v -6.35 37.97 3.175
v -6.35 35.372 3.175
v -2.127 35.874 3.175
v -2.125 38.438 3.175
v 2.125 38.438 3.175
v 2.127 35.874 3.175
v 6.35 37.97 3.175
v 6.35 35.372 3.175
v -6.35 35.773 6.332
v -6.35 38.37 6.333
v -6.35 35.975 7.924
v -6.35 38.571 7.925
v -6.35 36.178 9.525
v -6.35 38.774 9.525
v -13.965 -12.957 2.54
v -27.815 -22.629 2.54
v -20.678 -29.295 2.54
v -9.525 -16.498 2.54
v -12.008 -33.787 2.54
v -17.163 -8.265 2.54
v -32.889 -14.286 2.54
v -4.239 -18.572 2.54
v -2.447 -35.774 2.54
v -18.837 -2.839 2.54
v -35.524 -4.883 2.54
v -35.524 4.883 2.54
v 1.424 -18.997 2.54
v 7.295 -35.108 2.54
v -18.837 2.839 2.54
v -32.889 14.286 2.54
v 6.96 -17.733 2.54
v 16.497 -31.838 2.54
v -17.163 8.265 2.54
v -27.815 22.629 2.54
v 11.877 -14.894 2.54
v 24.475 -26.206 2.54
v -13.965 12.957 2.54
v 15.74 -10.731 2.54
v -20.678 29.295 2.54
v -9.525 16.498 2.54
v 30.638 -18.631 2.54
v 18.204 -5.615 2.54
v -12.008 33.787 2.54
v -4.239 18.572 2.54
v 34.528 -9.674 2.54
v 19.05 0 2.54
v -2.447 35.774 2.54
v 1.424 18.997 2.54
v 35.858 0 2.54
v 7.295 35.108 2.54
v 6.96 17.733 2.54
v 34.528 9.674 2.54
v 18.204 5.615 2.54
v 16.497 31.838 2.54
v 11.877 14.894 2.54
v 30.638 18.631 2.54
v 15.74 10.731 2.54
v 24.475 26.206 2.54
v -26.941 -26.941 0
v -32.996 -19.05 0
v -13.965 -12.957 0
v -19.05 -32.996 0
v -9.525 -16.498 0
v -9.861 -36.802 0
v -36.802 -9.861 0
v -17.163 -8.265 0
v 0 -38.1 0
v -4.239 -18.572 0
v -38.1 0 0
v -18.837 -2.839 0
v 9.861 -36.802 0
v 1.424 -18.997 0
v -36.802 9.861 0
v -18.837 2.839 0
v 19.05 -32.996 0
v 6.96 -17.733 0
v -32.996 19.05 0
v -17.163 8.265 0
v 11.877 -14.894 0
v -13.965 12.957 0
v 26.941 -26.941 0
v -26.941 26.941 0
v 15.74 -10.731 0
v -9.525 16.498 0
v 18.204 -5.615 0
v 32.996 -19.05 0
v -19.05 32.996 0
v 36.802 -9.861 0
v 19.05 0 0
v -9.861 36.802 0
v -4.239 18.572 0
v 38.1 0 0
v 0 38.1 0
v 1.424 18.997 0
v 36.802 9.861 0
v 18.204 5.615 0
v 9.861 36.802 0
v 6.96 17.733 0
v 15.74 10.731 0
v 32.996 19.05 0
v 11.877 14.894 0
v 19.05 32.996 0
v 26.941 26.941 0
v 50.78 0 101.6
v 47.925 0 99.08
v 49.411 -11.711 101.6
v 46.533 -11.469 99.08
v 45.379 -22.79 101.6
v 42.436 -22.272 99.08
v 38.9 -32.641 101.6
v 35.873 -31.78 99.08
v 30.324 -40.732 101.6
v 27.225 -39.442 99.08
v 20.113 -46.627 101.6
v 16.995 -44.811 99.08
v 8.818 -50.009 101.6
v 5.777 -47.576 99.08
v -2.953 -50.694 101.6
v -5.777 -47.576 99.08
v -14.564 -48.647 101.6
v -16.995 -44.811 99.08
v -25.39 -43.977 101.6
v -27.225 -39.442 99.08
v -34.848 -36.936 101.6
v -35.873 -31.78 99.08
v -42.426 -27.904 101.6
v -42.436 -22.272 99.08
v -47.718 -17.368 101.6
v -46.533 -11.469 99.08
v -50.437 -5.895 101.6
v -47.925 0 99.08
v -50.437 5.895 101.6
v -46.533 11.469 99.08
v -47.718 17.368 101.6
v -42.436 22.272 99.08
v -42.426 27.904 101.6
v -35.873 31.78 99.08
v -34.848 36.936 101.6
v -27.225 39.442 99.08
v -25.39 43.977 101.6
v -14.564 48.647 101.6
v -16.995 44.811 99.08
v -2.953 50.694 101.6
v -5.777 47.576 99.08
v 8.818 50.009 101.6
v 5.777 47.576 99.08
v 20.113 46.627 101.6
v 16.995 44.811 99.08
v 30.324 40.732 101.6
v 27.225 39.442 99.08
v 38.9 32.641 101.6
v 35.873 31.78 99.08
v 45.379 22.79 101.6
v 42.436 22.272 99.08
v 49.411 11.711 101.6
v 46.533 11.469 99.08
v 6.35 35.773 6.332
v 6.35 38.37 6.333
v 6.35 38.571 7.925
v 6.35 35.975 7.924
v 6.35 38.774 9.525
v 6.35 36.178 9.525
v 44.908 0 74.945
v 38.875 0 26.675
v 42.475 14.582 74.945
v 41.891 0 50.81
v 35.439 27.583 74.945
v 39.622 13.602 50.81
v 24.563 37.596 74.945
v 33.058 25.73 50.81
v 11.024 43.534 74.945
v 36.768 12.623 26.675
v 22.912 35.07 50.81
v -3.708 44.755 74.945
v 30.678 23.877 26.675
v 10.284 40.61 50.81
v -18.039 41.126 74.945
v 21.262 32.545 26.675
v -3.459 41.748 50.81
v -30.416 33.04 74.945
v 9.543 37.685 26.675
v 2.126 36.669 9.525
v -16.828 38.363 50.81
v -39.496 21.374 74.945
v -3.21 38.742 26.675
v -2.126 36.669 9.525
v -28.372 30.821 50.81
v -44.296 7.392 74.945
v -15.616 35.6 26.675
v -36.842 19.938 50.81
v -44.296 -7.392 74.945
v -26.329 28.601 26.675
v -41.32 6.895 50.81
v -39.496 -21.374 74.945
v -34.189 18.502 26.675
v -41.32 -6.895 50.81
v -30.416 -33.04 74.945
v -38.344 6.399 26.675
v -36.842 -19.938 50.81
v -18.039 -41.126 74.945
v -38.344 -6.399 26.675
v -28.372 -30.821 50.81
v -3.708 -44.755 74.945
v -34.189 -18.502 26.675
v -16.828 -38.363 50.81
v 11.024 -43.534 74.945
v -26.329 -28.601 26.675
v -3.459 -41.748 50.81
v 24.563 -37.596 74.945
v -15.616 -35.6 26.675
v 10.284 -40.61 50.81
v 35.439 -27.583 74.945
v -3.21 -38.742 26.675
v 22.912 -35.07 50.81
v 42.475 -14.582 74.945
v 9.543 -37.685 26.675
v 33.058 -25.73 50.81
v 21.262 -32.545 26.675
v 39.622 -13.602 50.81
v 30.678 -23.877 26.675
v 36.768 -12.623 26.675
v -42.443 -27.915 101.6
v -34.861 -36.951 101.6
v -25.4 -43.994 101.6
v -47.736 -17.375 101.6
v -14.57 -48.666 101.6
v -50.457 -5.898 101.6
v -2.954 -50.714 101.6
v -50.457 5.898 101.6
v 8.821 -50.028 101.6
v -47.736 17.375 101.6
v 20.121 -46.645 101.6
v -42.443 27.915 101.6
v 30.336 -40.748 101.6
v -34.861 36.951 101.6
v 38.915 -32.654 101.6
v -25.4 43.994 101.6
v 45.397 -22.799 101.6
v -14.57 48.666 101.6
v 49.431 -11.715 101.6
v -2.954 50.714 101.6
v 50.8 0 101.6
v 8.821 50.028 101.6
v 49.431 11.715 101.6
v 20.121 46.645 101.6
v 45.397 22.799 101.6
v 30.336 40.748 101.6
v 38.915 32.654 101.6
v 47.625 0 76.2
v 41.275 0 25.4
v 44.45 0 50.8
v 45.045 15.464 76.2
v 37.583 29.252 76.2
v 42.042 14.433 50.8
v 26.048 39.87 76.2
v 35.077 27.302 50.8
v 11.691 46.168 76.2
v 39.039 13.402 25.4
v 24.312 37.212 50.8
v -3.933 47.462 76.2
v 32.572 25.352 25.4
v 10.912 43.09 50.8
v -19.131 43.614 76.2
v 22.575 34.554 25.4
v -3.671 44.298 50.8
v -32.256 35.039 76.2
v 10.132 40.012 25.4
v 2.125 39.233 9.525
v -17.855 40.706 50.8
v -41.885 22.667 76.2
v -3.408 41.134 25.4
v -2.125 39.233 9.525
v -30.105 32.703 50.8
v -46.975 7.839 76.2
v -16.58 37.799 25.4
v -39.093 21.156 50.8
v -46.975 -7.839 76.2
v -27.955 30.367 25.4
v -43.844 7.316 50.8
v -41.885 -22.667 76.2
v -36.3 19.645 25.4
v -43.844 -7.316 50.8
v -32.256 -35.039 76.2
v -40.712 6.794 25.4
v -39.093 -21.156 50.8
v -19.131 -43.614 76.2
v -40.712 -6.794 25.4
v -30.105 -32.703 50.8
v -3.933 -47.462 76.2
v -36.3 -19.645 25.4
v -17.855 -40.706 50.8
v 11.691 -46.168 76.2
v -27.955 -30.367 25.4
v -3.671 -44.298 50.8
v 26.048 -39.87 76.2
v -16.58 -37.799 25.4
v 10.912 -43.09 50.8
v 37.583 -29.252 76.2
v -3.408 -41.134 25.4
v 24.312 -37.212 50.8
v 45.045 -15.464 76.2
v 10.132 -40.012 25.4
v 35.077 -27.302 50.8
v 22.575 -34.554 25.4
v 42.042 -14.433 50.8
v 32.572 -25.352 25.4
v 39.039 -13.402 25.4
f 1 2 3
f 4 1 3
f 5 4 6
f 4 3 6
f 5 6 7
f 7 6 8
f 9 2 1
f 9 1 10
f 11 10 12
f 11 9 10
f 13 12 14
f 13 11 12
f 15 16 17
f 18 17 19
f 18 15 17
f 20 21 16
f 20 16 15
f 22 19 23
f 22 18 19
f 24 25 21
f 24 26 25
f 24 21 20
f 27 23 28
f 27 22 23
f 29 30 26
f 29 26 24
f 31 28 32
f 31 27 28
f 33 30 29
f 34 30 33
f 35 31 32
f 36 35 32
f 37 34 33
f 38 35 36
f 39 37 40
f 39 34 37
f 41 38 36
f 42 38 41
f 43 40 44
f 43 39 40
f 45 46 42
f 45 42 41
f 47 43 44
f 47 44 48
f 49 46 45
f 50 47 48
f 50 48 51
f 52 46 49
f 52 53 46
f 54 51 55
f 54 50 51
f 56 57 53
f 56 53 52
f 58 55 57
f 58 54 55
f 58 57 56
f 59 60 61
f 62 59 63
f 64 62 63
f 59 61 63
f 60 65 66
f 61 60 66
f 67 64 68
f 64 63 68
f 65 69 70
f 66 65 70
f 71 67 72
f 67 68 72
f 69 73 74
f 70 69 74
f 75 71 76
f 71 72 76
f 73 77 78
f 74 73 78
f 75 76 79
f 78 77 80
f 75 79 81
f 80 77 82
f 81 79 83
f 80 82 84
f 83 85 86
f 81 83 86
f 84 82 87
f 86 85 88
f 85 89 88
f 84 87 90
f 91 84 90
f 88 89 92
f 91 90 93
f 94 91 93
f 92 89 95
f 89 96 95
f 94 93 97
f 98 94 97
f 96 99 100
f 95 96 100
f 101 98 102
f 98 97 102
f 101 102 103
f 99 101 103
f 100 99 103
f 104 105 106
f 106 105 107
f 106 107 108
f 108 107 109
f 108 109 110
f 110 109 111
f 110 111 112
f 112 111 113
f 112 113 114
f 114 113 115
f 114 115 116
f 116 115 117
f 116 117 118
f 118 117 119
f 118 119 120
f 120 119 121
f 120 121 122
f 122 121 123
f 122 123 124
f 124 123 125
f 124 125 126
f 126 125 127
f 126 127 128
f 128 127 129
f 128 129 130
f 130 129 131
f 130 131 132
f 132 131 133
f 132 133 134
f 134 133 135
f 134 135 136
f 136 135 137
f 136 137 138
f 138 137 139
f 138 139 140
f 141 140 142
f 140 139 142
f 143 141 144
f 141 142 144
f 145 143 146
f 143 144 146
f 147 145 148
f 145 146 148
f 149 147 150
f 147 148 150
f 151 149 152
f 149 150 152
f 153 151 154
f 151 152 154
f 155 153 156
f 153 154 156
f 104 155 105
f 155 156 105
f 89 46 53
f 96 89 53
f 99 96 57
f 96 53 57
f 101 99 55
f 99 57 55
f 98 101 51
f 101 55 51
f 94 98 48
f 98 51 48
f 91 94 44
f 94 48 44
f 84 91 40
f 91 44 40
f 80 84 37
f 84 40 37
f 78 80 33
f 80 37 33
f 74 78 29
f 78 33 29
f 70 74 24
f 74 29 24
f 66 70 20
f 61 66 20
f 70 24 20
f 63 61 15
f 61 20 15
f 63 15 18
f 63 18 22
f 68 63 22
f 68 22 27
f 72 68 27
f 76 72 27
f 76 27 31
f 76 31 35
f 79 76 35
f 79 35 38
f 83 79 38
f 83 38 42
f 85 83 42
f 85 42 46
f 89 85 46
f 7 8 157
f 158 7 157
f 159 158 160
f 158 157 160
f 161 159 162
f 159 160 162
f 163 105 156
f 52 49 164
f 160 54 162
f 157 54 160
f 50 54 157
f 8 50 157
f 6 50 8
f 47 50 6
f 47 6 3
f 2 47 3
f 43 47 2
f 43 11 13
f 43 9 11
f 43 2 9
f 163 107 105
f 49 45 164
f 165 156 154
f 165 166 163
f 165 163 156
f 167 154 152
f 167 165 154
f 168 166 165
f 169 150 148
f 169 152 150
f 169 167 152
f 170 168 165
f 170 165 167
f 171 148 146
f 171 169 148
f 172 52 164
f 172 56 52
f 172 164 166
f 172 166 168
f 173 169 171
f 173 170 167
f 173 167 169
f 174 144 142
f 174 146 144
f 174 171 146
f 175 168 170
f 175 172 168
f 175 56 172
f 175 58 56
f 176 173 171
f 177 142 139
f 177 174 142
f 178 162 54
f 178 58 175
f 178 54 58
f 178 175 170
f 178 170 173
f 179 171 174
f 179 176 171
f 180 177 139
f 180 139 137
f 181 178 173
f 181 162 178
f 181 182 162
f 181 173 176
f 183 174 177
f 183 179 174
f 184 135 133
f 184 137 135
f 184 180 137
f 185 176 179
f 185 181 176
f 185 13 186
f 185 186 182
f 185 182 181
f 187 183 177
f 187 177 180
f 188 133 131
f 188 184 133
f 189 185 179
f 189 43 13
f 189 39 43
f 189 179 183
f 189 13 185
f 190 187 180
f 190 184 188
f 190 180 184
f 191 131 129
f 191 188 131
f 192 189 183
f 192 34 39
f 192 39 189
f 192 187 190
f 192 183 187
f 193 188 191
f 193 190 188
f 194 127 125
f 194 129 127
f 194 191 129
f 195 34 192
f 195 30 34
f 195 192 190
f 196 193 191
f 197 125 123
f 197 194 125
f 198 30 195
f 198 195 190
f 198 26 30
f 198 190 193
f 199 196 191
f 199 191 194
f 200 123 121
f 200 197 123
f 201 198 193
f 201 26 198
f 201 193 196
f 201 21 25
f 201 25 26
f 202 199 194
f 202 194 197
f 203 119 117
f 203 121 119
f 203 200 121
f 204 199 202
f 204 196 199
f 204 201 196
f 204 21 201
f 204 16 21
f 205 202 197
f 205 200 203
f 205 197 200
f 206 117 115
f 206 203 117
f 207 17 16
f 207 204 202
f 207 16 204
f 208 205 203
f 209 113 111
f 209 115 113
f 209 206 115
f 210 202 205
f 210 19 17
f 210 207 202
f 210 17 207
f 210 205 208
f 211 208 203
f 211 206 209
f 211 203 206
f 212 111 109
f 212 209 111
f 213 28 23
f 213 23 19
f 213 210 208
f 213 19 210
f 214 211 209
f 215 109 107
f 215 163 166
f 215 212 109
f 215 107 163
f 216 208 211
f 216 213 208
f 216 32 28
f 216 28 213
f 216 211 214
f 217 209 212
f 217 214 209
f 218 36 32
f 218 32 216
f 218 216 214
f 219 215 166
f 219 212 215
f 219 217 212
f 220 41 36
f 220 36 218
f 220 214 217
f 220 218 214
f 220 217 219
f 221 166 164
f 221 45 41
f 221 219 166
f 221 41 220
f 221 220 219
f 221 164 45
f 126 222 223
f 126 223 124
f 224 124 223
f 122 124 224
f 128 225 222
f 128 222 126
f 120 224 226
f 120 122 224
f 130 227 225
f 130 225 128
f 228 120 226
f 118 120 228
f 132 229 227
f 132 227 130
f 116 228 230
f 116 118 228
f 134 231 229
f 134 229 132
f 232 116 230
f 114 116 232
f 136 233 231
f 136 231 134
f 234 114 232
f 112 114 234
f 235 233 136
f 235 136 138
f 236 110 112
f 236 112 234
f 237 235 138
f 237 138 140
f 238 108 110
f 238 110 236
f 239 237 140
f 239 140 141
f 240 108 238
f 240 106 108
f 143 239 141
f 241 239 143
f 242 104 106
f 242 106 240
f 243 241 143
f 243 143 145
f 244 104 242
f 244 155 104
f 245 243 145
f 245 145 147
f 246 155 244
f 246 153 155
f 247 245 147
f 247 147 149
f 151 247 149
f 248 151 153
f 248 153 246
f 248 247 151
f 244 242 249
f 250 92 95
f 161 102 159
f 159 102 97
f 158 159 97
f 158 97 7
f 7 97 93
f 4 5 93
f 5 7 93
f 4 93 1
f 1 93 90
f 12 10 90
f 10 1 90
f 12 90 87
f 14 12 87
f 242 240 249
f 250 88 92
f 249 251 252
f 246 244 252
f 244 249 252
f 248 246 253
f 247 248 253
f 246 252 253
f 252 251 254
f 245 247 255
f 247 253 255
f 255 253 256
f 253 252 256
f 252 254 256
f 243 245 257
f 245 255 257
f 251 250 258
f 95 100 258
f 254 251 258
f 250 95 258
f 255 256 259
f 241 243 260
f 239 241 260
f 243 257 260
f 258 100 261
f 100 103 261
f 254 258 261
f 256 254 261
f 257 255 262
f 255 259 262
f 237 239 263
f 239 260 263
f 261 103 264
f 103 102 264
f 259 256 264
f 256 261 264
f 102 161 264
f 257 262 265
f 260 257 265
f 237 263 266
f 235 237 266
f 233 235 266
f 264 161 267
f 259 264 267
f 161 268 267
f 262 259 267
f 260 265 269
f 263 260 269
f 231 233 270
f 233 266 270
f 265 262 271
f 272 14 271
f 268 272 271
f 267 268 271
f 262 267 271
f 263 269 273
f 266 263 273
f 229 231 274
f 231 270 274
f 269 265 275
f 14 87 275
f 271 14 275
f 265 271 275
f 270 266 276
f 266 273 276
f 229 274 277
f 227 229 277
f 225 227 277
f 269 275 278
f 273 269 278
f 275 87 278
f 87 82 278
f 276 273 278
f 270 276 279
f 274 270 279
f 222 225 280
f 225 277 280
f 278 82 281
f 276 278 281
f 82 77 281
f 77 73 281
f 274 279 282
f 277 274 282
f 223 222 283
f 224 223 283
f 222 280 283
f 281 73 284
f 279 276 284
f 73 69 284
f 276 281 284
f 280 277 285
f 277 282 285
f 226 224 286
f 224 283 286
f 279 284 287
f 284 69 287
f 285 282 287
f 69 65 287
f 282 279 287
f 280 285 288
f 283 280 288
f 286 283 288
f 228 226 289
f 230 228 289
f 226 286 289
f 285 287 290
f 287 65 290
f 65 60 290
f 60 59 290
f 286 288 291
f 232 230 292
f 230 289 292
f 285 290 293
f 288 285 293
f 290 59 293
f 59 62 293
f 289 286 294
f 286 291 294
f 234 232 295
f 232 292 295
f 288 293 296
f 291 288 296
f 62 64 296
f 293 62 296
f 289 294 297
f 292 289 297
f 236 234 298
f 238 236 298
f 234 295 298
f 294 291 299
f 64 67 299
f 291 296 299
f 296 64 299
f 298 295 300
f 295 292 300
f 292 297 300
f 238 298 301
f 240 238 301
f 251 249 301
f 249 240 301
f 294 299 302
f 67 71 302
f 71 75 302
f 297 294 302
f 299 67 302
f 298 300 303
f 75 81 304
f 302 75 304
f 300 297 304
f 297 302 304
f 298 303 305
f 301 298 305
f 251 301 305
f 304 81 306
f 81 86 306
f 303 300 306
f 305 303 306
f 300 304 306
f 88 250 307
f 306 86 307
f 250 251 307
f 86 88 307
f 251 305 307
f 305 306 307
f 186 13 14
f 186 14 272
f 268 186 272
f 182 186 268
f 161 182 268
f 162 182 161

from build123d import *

# Parameters (mm, degrees)
F2_R     = 50.8
F0_R     = 38.1
F4_T     = -2.54
F5_W     = 12.7
F5_H     = 6.35
F6_DEPTH = 40.132
F8_R     = 19.05
F9_DEPTH = 25.4


# Not quite as in the source:
# - a fillet or chamfer that OpenCascade refuses, or shapes differently, is made with other operations: its cross-section is extruded or revolved along the edge and cut away or added


with BuildPart() as f3:
    # F2 (on offset) → F3 section 0
    with BuildSketch(Plane.XY.offset(101.6)):
        Circle(F2_R)
    # F0 (on Top) → F3 section 1
    with BuildSketch(Plane.XY):
        Circle(F0_R)
    loft()

    # F4
    f4_openings = [f3.faces().sort_by_distance(p)[0] for p in [
        (0, 0, 101.6),
    ]]
    offset(amount=F4_T, openings=f4_openings, kind=Kind.INTERSECTION)

    # F5 (on Front) → F6 (cut)
    with BuildSketch(Plane.XZ):
        with Locations((0, 6.35)):
            Rectangle(F5_W, F5_H)
    extrude(amount=-F6_DEPTH, mode=Mode.SUBTRACT)

    # F7: chamfer of 2.54 on 1 edges, made by hand

    # F7_s1 → F7_t2 (revolve, cut)
    with BuildSketch(Plane.XZ):
        Polygon((50.7802331649, 101.6), (47.9251849391, 99.0796141931), (48.2402331649, 101.6), align=None)
    revolve(axis=Axis((0, 0, 101.6), (0, 0, -1)), mode=Mode.SUBTRACT)

    # F8 (on face) → F9 (cut)
    with BuildSketch(Plane.XY.offset(2.54)):
        Circle(F8_R)
    extrude(amount=-F9_DEPTH, mode=Mode.SUBTRACT)


solid = f3.part
